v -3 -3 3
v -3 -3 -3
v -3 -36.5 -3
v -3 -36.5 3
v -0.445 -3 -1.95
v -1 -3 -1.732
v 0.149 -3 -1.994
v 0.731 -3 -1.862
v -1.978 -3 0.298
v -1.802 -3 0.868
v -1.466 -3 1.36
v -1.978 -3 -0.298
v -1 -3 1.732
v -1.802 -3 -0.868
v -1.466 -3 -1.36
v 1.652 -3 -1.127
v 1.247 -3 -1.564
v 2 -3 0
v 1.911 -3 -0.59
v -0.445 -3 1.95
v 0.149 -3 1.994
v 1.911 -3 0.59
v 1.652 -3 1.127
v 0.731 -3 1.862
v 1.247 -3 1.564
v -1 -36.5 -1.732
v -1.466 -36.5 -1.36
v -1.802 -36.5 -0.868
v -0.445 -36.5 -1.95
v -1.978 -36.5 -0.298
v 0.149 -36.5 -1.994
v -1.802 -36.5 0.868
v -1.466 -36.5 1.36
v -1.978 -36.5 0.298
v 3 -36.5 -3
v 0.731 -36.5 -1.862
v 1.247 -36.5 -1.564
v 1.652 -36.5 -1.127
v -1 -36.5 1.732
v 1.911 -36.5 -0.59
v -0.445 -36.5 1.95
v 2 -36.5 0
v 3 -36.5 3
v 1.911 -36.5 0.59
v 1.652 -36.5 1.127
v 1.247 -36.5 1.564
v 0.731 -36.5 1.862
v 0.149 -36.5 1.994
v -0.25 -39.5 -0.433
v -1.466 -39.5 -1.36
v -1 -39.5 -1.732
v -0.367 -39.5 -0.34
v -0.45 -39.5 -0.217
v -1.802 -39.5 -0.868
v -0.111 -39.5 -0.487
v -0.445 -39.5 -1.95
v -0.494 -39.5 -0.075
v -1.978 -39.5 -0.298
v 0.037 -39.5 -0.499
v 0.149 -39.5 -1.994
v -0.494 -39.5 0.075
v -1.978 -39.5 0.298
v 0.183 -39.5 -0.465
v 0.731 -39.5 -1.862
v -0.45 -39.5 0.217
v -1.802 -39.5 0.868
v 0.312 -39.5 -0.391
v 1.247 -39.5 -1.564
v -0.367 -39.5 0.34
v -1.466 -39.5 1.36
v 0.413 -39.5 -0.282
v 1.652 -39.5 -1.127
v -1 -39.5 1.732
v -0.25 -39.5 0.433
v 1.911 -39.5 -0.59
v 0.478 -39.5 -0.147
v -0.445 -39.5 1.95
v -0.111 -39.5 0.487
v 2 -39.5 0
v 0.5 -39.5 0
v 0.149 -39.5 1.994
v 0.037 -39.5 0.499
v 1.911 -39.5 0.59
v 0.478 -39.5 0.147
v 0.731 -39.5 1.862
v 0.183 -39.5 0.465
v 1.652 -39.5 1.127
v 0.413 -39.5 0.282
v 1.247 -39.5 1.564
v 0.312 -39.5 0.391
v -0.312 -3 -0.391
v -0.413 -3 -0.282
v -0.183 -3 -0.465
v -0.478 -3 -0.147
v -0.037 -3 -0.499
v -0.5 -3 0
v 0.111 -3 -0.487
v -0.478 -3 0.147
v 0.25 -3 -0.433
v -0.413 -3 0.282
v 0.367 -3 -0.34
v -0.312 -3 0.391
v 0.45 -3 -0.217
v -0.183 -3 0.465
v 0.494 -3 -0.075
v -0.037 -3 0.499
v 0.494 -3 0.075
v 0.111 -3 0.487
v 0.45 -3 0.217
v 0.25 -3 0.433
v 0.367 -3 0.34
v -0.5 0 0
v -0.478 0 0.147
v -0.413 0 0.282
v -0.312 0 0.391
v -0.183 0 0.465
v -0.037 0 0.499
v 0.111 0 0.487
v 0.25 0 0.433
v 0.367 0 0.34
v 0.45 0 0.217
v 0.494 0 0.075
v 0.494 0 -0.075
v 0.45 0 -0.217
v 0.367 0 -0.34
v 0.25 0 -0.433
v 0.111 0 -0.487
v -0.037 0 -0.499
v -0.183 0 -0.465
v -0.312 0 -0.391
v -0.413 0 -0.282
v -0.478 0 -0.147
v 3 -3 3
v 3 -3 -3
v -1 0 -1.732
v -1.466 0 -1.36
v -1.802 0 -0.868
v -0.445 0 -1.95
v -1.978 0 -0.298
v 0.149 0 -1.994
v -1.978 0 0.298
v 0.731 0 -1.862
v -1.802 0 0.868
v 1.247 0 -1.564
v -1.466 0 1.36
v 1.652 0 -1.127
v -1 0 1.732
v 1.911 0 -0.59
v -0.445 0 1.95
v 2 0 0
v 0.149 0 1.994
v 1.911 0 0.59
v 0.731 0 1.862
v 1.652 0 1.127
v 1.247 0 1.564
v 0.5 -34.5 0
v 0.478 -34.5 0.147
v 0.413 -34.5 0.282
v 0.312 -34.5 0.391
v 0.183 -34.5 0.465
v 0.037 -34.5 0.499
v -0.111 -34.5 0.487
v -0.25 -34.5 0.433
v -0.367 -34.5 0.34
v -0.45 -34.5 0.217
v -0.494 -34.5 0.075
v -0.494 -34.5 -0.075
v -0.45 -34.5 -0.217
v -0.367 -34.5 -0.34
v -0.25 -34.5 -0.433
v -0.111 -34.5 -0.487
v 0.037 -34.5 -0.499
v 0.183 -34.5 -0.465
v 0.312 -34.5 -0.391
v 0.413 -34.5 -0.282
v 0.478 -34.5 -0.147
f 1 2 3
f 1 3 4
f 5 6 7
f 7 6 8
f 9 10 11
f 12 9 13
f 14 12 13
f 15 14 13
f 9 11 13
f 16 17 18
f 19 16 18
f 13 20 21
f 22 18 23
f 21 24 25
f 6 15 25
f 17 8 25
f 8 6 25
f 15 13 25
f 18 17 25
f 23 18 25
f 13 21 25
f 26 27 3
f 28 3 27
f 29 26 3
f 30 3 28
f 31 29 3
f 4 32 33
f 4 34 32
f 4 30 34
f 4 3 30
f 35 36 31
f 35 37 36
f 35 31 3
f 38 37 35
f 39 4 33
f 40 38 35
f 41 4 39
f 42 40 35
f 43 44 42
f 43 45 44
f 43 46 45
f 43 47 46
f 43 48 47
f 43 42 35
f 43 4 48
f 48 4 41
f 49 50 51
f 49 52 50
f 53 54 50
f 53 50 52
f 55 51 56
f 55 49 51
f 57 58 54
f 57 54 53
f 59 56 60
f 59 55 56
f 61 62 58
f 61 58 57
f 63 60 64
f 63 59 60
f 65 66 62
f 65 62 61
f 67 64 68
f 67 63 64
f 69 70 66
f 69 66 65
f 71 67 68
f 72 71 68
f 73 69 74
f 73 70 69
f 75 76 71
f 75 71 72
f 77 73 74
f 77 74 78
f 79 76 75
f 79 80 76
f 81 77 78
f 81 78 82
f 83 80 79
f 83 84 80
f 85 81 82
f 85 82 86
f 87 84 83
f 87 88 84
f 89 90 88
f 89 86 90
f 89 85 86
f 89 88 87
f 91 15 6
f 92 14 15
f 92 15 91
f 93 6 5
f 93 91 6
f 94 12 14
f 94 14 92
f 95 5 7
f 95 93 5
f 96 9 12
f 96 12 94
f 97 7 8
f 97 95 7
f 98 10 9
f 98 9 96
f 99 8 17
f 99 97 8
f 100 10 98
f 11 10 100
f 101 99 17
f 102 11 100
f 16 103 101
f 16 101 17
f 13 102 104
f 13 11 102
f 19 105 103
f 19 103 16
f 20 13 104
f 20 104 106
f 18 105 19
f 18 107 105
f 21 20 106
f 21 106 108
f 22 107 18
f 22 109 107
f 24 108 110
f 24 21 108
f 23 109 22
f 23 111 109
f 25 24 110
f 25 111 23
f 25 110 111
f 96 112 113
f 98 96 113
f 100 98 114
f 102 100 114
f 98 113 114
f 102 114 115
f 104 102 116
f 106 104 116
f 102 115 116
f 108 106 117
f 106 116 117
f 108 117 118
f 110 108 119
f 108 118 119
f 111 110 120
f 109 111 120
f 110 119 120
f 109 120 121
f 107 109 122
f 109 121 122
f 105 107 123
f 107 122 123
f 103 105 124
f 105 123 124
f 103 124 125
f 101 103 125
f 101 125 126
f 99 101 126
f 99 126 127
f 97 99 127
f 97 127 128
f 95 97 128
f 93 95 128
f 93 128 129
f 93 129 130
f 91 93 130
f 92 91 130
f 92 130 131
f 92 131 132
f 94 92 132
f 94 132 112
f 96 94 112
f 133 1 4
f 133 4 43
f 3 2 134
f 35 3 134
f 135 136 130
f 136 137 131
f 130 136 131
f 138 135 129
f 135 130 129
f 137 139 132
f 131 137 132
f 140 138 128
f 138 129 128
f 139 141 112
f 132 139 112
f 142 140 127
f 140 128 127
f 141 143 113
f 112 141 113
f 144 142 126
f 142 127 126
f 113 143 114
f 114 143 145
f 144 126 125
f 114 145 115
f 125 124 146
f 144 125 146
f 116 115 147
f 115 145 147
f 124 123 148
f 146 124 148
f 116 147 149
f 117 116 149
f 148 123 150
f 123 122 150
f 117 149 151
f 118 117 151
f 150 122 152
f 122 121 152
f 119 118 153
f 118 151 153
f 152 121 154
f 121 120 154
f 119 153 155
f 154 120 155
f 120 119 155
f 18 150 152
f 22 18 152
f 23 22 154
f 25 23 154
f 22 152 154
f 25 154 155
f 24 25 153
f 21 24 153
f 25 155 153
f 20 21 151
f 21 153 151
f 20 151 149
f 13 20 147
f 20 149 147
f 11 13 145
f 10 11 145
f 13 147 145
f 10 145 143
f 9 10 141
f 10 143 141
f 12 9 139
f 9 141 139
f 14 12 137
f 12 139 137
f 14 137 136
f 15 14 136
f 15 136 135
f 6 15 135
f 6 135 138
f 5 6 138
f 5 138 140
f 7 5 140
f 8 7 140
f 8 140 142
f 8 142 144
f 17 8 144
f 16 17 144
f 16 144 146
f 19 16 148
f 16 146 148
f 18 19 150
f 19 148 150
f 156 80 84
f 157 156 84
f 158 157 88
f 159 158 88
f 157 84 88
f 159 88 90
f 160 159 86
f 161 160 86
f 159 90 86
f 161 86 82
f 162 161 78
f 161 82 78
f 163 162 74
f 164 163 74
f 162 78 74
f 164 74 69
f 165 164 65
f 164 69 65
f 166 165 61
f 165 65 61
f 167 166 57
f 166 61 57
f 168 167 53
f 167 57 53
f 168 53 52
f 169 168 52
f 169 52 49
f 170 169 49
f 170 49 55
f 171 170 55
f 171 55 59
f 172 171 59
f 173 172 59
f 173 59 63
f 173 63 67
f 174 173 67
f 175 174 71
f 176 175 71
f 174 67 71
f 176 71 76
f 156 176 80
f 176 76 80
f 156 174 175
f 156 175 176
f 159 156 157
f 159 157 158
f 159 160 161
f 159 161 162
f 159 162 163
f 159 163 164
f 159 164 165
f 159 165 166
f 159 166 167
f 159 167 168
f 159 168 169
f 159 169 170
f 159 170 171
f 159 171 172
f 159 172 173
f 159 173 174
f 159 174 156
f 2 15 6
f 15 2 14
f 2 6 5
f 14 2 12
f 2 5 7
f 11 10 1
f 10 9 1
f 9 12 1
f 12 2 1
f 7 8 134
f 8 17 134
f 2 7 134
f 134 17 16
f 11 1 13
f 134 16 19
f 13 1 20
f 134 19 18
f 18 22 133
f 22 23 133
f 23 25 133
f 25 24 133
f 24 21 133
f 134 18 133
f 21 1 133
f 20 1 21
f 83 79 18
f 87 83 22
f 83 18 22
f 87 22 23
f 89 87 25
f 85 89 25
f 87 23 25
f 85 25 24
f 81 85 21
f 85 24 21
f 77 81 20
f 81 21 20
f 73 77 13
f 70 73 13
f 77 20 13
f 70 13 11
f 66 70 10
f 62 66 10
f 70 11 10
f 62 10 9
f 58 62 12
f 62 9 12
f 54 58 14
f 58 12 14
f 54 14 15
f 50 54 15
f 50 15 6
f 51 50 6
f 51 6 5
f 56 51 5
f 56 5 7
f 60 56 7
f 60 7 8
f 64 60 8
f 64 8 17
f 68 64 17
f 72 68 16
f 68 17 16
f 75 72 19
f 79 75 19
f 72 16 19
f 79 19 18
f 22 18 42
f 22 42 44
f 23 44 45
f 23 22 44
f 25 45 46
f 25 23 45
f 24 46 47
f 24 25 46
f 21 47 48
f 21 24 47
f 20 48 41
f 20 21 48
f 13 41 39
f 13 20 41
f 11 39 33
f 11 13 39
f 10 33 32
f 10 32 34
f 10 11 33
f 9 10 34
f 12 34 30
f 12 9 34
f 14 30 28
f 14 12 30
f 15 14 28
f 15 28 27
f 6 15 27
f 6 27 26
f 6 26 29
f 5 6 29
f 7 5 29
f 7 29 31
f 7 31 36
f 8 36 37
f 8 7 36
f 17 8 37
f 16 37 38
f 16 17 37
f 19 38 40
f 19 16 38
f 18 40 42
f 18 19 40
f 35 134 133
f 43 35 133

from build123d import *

# Parameters (mm, degrees)
F0_R     = 2
F1_DEPTH = 3
F2_W     = 6
F2_H     = 6
F2_R     = 2
F3_DEPTH = 33.5
F4_DEPTH = 36.5
F5_R     = 0.5
F6_DEPTH = 5
F7_R     = 0.5
F8_DEPTH = 5


with BuildPart() as f1:
    # F0 (on Front) → F1 (new body)
    with BuildSketch(Plane.XZ):
        Circle(F0_R)
    extrude(amount=F1_DEPTH)


with BuildPart() as f3:
    # F2 (on face) → F3 (new body)
    with BuildSketch(Plane.XZ.offset(3)):
        Rectangle(F2_W, F2_H)
        Circle(F2_R, mode=Mode.SUBTRACT)
    extrude(amount=F3_DEPTH)


with BuildPart() as f4:
    # F4 (new): a face of the model
    f4_faces = [f1.part.faces().sort_by_distance(p)[0] for p in [
        (0, -3, 0),
    ]]
    extrude(f4_faces, amount=F4_DEPTH)

    # F5 (on face) → F6 (cut)
    with BuildSketch(Plane.XZ.offset(39.5)):
        Circle(F5_R)
    extrude(amount=-F6_DEPTH, mode=Mode.SUBTRACT)


with BuildPart() as f1_1:
    add(f1.part)

    # F7 (on face) → F8 (cut)
    with BuildSketch(Plane(origin=(0, 0, 0), x_dir=(-1, 0, 0), z_dir=(0, 1, 0))):
        Circle(F7_R)
    extrude(amount=-F8_DEPTH, mode=Mode.SUBTRACT)


solid = Compound([f3.part, f4.part, f1_1.part])
